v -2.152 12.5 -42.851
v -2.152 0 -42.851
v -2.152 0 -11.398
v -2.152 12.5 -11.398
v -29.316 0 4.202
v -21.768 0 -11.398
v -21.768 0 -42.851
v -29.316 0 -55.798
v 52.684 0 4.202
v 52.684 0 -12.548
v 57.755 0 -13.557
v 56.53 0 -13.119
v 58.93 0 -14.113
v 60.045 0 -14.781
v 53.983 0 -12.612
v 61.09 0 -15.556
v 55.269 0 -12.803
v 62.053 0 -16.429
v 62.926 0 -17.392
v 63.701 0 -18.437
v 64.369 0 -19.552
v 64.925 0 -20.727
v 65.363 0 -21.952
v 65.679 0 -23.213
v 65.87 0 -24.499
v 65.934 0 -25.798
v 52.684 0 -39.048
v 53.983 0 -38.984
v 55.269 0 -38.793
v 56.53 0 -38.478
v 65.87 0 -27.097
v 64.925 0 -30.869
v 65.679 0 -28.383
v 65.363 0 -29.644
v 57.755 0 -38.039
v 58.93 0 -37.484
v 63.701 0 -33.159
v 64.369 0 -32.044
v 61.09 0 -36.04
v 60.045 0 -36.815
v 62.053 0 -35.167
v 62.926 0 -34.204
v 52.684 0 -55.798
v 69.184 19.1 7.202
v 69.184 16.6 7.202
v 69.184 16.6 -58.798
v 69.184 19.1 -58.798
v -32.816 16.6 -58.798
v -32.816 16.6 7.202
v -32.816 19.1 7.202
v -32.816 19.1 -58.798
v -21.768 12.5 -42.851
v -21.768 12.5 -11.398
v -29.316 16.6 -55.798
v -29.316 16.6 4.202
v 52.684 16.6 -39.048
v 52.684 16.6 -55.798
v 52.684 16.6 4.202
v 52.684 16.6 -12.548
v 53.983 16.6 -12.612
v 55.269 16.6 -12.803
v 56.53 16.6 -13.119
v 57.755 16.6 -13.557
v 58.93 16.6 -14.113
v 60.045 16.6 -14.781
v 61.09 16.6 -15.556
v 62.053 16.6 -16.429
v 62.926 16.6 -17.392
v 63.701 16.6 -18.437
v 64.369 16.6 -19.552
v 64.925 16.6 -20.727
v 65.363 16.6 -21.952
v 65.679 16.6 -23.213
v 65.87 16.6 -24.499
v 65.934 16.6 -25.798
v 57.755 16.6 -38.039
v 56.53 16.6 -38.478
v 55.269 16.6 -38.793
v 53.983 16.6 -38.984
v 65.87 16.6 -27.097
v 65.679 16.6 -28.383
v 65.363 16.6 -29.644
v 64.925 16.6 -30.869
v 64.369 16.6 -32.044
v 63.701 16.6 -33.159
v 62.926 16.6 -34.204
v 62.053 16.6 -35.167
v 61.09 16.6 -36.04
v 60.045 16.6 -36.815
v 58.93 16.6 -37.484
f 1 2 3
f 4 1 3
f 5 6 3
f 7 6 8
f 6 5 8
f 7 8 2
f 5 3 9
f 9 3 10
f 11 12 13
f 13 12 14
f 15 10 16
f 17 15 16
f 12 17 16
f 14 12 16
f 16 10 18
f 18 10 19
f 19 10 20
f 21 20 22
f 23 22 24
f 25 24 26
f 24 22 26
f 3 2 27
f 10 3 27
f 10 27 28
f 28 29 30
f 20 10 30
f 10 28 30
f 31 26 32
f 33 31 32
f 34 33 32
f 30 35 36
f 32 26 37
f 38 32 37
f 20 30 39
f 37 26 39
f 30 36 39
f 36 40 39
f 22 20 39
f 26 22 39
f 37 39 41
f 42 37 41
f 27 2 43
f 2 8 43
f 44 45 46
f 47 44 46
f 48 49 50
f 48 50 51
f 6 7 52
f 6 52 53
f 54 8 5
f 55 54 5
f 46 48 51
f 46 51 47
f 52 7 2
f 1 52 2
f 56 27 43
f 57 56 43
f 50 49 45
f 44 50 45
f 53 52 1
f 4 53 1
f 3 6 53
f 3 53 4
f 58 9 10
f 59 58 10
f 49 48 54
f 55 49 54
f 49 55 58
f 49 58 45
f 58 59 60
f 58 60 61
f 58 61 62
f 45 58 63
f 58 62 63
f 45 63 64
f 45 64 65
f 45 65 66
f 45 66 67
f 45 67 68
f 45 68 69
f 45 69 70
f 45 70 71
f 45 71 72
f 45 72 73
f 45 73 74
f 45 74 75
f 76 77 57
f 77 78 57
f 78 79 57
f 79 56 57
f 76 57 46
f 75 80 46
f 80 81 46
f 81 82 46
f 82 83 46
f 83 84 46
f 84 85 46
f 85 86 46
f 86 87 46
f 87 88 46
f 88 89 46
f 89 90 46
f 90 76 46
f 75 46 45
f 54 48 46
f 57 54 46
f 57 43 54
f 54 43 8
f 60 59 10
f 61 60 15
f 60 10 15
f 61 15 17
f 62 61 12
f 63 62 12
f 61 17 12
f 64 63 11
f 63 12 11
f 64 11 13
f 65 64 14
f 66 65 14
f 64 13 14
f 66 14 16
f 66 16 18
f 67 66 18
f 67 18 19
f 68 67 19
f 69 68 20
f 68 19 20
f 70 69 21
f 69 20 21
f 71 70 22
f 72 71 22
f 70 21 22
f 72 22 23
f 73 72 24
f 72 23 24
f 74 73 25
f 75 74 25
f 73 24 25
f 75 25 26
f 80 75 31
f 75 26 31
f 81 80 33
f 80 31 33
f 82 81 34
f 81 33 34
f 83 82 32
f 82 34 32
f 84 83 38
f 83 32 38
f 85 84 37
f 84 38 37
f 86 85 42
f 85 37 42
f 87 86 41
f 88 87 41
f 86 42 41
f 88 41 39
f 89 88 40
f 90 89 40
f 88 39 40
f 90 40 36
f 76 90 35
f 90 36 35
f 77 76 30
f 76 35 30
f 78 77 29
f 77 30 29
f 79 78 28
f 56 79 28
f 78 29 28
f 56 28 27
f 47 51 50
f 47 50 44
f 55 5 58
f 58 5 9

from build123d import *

# Parameters (mm, degrees)
DODANIE_WYCI_GNI_CIE1_DEPTH = 16.6
SZKIC2_W                    = 102
SZKIC2_H                    = 66
DODANIE_WYCI_GNI_CIE3_DEPTH = 2.5
SZKIC4_W                    = 19.615634033
SZKIC4_H                    = 31.453270058
WYTNIJ_WYCI_GNI_CIE2_DEPTH  = 12.5


with BuildPart() as part:
    # Szkic1 → Dodanie-wyciągnięcie1 (new body)
    with BuildSketch(Plane(origin=(0, 0, 0), x_dir=(1, 0, 0), z_dir=(0, 1, 0))):
        with BuildLine():
            Line((-29.315960912, -4.201954397), (52.684039088, -4.201954397))
            Line((52.684039088, -4.201954397), (52.684039088, 12.548045603))
            ThreePointArc((52.684039088, 12.548045603), (65.934039088, 25.798045603), (52.684039088, 39.048045603))
            Line((52.684039088, 39.048045603), (52.684039088, 55.798045603))
            Line((52.684039088, 55.798045603), (-29.315960912, 55.798045603))
            Line((-29.315960912, 55.798045603), (-29.315960912, -4.201954397))
        make_face()
    extrude(amount=DODANIE_WYCI_GNI_CIE1_DEPTH)

    # Szkic2 → Dodanie-wyciągnięcie3 (add)
    with BuildSketch(Plane(origin=(0, 16.6, 0), x_dir=(1, 0, 0), z_dir=(0, 1, 0))):
        with Locations((18.184039088, 25.798045603)):
            Rectangle(SZKIC2_W, SZKIC2_H)
    extrude(amount=DODANIE_WYCI_GNI_CIE3_DEPTH)

    # Szkic4 → Wytnij-wyciągnięcie2 (cut)
    with BuildSketch(Plane.XZ):
        with Locations((-11.960019209, -27.124412261)):
            Rectangle(SZKIC4_W, SZKIC4_H)
    extrude(amount=-WYTNIJ_WYCI_GNI_CIE2_DEPTH, mode=Mode.SUBTRACT)


solid = part.part
